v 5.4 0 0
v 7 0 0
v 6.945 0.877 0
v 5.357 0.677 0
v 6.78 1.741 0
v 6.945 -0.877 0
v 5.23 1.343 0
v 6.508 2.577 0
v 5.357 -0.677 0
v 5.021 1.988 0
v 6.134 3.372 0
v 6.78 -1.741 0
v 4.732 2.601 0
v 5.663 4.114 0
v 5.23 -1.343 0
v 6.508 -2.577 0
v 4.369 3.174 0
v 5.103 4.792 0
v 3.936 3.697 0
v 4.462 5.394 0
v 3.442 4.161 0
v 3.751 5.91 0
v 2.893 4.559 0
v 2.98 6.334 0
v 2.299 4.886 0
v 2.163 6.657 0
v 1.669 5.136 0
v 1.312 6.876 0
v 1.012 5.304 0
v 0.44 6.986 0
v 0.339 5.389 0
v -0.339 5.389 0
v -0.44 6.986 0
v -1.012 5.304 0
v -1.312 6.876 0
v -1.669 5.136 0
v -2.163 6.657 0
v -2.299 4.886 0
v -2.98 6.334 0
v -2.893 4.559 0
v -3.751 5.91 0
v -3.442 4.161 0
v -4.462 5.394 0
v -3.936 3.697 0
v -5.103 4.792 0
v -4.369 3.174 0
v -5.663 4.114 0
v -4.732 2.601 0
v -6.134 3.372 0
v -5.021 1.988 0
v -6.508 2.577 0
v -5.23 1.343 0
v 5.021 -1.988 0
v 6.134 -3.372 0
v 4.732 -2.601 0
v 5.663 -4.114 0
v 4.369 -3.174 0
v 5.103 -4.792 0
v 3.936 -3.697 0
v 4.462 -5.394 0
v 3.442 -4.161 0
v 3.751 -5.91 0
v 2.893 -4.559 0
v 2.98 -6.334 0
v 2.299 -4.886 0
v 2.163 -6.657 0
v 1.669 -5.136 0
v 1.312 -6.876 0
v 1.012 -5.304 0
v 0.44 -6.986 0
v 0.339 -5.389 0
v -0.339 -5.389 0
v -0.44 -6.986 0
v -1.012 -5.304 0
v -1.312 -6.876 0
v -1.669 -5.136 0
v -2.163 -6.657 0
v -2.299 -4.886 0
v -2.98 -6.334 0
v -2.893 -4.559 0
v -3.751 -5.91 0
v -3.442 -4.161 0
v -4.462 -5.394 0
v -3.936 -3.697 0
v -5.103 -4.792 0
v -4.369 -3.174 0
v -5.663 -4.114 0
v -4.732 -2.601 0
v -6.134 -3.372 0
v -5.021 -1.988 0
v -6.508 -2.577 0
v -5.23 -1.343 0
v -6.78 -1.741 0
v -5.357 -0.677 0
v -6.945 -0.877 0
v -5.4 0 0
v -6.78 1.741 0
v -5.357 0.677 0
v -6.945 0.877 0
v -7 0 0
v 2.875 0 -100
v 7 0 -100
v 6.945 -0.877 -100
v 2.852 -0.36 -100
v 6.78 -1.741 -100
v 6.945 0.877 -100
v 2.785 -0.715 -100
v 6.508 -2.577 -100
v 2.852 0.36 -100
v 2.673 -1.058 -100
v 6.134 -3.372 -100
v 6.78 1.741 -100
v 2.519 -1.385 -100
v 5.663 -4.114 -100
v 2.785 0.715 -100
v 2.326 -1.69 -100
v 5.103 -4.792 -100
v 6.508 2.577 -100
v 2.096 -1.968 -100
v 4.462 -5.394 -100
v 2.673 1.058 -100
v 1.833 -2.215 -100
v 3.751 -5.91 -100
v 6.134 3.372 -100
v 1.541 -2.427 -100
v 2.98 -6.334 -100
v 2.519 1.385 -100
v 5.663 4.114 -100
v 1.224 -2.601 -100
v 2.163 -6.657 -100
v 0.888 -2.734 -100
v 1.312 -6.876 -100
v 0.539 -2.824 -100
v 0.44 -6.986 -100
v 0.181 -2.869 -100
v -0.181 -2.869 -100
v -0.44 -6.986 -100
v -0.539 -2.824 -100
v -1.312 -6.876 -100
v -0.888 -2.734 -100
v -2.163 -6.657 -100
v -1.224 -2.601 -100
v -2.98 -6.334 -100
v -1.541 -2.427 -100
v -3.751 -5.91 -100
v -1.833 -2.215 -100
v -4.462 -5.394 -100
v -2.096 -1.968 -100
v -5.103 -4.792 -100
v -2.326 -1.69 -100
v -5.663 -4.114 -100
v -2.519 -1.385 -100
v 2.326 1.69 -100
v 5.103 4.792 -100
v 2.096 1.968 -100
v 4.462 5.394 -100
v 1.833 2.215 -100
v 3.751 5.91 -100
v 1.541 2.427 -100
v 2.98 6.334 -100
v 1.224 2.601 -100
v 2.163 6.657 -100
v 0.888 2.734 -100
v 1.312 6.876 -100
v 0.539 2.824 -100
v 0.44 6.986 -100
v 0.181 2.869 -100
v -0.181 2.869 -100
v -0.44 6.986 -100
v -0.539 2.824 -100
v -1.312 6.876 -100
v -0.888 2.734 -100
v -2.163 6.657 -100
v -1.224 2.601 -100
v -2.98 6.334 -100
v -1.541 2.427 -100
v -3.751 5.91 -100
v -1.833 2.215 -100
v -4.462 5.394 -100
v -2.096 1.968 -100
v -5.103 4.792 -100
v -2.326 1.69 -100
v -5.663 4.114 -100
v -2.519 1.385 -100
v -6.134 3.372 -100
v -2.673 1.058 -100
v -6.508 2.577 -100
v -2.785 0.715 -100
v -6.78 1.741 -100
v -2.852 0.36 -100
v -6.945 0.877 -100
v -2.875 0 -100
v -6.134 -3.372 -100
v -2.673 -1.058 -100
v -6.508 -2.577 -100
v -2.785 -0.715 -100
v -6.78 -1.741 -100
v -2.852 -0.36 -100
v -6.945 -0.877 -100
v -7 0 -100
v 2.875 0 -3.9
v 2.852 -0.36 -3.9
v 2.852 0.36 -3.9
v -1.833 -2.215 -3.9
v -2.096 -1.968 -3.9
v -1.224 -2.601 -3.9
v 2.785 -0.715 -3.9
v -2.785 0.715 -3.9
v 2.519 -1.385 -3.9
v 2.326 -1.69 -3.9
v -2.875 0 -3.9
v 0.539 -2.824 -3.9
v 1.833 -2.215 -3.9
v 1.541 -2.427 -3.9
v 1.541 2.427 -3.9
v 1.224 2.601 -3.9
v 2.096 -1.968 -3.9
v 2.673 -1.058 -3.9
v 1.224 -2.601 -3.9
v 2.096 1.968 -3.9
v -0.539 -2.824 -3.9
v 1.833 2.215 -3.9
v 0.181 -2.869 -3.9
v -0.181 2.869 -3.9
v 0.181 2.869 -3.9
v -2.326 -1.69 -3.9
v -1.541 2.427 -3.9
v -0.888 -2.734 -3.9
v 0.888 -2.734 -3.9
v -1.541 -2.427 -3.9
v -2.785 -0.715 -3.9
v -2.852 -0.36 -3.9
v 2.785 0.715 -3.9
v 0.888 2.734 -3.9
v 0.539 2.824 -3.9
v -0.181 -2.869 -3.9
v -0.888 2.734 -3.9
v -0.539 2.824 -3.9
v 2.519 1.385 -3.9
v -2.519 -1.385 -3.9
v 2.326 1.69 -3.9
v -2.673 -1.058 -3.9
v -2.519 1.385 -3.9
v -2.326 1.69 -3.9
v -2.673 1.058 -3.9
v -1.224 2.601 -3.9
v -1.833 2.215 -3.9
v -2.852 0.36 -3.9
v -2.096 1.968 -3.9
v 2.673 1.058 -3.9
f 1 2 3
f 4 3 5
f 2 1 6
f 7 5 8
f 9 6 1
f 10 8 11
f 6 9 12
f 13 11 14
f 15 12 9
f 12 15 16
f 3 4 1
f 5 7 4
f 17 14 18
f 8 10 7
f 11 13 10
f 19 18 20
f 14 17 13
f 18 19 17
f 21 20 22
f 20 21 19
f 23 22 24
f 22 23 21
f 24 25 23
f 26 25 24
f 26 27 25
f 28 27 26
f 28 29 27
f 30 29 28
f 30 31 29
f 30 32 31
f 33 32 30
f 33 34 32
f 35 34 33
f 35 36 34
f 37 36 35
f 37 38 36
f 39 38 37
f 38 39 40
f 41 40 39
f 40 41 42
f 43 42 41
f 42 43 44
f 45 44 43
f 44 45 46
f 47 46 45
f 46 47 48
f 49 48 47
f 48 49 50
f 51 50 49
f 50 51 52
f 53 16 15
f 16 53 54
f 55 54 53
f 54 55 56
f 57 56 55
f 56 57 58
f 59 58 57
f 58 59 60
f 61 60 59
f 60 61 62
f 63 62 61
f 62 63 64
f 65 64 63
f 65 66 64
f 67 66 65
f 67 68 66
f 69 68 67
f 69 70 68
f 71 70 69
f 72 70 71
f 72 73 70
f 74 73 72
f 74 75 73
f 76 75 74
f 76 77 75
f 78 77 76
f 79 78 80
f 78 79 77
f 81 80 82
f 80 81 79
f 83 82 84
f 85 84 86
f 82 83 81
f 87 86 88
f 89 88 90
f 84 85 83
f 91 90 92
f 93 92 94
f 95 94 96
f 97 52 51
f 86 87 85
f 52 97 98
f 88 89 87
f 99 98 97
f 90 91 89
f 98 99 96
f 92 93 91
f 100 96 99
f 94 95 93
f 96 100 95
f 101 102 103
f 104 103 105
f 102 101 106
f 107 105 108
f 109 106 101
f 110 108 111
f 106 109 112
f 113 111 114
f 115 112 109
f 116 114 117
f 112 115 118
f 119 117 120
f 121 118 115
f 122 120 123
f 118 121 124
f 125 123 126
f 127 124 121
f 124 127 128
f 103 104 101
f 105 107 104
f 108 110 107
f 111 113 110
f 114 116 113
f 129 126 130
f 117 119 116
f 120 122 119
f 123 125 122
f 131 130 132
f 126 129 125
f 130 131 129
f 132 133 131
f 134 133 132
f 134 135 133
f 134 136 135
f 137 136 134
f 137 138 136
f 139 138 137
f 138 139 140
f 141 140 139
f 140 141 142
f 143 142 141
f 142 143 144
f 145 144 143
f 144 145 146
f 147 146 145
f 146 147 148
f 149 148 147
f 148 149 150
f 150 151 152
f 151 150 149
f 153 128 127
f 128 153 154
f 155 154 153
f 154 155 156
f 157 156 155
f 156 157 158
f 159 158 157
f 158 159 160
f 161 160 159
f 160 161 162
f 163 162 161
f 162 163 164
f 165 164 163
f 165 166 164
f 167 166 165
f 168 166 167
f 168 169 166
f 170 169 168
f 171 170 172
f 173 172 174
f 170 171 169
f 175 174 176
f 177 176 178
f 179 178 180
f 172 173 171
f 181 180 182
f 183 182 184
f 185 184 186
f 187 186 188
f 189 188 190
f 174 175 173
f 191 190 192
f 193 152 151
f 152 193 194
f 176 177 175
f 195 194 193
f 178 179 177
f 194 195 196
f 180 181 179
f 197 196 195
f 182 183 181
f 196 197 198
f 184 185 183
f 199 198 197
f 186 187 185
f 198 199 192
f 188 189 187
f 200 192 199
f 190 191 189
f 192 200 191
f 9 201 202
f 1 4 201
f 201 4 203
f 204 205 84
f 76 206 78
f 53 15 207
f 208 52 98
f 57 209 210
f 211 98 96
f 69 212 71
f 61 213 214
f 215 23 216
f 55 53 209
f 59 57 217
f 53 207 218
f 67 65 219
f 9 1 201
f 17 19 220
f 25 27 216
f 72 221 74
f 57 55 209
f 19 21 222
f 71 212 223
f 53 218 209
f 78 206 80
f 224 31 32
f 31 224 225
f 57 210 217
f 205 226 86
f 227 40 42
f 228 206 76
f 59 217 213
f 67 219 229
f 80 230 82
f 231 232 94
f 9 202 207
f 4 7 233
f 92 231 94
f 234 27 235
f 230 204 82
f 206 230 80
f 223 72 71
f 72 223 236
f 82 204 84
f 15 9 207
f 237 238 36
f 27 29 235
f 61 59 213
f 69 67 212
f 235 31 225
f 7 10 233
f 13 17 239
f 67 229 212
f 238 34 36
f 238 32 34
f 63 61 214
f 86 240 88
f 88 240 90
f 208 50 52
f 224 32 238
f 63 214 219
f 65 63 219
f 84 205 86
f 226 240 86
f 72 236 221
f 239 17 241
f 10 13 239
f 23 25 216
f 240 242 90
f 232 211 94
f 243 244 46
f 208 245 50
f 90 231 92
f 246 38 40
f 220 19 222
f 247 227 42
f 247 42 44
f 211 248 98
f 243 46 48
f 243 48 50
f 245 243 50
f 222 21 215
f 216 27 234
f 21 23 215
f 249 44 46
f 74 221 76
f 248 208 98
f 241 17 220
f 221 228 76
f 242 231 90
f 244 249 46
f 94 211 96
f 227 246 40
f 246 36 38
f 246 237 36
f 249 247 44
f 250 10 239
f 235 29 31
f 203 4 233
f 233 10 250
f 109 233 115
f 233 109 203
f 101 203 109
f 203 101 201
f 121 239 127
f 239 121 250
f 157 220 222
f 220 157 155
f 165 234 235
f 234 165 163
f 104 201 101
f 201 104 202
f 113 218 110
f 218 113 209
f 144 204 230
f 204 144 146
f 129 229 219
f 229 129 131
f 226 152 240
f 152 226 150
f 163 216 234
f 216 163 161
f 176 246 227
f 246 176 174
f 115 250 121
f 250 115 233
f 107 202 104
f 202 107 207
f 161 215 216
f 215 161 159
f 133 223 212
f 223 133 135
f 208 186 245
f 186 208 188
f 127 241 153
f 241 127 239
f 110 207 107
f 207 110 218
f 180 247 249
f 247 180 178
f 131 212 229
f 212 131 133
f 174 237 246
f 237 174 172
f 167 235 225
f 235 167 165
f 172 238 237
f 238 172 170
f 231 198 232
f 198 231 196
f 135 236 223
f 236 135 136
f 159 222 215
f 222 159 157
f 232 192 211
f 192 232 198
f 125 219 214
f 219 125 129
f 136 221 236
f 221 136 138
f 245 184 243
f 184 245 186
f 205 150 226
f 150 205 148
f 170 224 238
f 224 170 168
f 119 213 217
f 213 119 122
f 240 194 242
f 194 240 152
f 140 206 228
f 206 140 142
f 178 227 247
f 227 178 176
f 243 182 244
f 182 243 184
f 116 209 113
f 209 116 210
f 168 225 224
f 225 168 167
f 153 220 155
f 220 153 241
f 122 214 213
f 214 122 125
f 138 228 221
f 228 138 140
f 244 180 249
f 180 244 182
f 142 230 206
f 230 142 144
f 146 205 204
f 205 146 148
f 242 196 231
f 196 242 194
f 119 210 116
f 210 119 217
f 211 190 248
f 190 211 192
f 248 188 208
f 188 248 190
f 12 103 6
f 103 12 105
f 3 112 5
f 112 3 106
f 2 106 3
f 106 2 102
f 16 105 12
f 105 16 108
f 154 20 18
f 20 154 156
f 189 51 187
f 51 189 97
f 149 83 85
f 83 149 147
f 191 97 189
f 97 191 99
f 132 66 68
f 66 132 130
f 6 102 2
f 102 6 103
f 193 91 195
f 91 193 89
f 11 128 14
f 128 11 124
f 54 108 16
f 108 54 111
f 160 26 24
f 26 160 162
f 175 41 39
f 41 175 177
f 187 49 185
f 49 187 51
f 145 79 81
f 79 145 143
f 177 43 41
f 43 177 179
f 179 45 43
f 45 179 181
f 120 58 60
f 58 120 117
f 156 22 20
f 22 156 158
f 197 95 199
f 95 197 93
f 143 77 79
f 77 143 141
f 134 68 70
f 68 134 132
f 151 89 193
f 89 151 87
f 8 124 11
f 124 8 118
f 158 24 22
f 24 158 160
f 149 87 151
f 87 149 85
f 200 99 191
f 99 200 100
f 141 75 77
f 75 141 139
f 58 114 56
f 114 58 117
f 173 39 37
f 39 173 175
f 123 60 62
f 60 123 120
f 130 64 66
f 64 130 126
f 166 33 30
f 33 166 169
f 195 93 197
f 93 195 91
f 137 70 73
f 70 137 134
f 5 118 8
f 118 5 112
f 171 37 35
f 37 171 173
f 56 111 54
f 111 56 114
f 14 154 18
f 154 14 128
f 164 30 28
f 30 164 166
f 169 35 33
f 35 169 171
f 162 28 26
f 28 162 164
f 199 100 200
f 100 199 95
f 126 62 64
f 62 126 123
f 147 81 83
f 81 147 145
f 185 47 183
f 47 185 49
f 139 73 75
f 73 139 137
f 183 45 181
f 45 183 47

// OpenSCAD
$fn = 50;


difference() {
	union() {
		translate(v = [0, 0, -100.0000000000]) {
			cylinder(h = 100, r = 7.0000000000);
		}
	}
	union() {
		translate(v = [0, 0, 0]) {
			rotate(a = [0, 0, 0]) {
				difference() {
					union() {
						#translate(v = [0, 0, -100.0000000000]) {
							cylinder(h = 100, r = 2.6000000000);
						}
						#translate(v = [0, 0, -3.9000000000]) {
							cylinder(h = 3.9000000000, r = 7.0000000000, r1 = 2.8750000000, r2 = 5.4000000000);
						}
						#translate(v = [0, 0, -100.0000000000]) {
							cylinder(h = 100, r = 2.8750000000);
						}
						#translate(v = [0, 0, -100.0000000000]) {
							cylinder(h = 100, r = 2.6000000000);
						}
					}
					union();
				}
			}
		}
	}
}
